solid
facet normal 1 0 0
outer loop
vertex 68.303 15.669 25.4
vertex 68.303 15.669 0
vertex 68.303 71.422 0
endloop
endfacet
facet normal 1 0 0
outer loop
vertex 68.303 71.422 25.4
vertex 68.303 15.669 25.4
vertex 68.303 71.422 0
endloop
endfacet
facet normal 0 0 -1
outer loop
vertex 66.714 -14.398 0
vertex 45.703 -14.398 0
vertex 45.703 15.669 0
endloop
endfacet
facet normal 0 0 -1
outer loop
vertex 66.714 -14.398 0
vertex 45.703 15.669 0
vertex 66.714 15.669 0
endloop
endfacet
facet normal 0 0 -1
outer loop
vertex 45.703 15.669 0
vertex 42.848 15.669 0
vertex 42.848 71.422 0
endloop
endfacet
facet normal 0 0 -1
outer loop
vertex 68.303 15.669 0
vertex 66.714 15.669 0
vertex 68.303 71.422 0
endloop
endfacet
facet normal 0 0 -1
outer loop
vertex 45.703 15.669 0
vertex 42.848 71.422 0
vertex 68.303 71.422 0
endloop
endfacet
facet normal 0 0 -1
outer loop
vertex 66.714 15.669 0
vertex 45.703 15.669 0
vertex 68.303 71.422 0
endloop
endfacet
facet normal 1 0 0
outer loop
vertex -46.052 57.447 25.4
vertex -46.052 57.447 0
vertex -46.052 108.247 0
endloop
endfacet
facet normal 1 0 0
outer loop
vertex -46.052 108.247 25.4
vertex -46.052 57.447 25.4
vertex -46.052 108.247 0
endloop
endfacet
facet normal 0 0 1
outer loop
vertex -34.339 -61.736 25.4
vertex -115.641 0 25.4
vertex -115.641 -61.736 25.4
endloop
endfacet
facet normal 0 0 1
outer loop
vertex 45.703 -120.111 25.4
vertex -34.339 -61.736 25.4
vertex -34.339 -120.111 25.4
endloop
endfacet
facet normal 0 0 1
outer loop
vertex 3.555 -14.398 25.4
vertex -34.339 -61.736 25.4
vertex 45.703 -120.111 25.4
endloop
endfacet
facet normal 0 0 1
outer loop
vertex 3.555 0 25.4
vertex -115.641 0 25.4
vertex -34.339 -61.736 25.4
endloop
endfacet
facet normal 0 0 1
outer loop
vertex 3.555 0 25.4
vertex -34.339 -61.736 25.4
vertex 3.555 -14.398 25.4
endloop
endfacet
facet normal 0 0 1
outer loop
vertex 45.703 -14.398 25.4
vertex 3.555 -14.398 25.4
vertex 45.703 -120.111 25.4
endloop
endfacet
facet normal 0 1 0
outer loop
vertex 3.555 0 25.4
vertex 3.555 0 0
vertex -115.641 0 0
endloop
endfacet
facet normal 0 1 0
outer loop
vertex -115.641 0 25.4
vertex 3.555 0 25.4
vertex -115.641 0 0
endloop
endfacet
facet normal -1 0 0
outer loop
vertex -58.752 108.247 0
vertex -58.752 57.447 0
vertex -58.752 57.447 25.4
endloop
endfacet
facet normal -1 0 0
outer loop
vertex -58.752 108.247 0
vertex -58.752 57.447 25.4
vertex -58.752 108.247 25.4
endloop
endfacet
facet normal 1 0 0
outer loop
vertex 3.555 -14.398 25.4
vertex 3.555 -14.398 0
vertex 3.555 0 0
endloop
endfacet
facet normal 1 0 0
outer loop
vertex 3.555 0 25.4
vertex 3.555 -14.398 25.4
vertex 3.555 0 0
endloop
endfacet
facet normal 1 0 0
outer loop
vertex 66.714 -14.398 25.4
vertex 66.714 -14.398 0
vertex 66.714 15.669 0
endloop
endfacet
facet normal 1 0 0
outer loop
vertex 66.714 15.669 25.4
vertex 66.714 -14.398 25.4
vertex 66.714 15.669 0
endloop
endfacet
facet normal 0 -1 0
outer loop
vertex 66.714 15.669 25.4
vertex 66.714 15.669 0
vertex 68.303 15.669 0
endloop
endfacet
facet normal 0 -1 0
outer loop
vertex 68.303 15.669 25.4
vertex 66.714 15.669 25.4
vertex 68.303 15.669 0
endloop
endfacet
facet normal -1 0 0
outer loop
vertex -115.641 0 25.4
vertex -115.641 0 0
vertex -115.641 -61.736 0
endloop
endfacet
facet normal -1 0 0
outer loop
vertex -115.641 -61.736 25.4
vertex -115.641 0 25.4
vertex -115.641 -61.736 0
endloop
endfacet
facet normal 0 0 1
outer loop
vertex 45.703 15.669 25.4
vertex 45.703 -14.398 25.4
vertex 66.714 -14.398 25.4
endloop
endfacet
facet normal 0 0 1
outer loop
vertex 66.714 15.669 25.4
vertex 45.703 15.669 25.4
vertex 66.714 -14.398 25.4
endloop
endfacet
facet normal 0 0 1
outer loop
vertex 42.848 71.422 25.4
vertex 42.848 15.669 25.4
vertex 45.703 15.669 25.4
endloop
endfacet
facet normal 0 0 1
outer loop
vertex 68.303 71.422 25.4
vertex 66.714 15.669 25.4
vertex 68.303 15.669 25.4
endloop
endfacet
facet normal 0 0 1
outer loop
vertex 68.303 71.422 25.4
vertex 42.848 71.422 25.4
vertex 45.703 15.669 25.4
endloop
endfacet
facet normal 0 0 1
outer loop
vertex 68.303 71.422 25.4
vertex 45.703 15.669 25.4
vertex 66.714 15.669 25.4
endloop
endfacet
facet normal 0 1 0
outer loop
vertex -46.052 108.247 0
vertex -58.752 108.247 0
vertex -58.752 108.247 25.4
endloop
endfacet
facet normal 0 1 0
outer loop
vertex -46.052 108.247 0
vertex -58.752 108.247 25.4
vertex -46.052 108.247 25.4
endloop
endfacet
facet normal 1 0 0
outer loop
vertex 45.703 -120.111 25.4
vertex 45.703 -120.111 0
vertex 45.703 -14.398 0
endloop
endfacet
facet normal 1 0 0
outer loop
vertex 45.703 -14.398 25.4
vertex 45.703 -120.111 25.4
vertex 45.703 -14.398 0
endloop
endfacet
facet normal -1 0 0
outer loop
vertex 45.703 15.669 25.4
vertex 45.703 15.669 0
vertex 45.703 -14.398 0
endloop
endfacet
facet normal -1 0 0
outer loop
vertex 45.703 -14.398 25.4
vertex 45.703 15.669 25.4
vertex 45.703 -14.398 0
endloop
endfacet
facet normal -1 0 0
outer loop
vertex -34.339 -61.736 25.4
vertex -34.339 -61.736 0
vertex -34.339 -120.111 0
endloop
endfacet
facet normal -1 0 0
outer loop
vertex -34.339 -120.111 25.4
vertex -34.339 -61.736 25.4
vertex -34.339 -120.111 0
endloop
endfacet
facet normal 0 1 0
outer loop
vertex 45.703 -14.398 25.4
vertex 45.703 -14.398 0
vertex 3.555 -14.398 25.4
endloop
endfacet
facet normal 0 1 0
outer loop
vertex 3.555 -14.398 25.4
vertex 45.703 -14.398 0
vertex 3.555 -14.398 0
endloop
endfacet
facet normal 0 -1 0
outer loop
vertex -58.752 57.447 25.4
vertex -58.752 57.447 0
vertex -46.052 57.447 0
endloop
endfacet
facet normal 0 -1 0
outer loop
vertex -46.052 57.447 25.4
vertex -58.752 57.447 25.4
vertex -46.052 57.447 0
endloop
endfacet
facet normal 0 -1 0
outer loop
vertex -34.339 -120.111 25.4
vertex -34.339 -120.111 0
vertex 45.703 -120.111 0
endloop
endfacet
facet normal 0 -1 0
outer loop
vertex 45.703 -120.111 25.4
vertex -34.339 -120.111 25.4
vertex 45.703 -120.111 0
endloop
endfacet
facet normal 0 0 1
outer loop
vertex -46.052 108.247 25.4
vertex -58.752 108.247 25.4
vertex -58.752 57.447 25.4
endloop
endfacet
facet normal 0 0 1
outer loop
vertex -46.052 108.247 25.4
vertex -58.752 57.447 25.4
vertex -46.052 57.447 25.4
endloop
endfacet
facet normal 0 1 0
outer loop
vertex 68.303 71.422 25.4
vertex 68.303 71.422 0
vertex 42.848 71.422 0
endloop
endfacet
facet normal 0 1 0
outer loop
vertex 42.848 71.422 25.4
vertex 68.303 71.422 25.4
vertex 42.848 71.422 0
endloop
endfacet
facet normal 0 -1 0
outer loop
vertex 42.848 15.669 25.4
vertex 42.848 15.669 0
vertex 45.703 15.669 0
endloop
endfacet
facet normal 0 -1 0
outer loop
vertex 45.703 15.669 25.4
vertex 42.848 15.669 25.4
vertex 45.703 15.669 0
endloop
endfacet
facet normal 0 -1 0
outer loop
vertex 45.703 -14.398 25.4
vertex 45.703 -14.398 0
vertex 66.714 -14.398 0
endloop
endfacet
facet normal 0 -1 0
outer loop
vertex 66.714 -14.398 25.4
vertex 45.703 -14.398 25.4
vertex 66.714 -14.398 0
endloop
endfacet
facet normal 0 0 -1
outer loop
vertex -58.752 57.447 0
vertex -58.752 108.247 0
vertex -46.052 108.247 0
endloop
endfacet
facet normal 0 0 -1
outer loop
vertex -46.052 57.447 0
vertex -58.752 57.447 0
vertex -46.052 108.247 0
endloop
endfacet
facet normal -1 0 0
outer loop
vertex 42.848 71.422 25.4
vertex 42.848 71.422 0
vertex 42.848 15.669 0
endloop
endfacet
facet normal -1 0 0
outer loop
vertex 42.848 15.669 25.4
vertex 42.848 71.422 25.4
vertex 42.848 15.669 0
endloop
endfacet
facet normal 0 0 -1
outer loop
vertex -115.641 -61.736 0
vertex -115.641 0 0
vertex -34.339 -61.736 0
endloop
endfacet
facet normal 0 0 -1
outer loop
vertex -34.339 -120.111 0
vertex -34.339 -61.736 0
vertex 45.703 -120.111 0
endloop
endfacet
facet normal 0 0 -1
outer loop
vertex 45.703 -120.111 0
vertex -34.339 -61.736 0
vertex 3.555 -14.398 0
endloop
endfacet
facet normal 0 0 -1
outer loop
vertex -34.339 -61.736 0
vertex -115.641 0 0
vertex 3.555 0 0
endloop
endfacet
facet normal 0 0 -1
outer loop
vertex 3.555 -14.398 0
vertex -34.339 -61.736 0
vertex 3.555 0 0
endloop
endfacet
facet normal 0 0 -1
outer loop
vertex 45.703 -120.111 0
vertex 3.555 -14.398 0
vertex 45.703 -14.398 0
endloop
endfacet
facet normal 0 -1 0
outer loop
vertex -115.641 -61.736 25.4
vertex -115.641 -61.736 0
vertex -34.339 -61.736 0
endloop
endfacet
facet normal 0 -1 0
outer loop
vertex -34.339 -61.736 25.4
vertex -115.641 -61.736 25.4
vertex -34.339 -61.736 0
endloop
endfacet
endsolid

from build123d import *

# Parameters (mm, degrees)
F0_W     = 37.8937845179
F0_H     = 47.3373946244
F1_DEPTH = 25.4
F0_W_2   = 21.0103082003
F0_H_2   = 30.0672181955
F0_H_3   = 0.2619628472
F0_W_3   = 12.7
F0_H_4   = 50.8


with BuildPart() as f1:
    # F0 (on Top) → F1 (new body)
    with BuildSketch(Plane.XY):
        Polygon((3.5545719384, -14.3982255389), (3.5545719384, 0), (-115.641171745, 0), (-115.641171745, -61.7356201633), (-34.3392125795, -61.7356201633), (-34.3392125795, -14.3982255389), align=None)
        Polygon((45.7032573575, -14.3982255389), (3.5545719384, -14.3982255389), (3.5545719384, -61.7356201633), (-34.3392125795, -61.7356201633), (-34.3392125795, -120.1114062909), (45.7032573575, -120.1114062909), align=None)
        with Locations((-15.3923203205, -38.0669228511)):
            Rectangle(F0_W, F0_H)
    extrude(amount=F1_DEPTH)


with BuildPart() as f1b:
    # F0 (on Top) → F1, piece 2 (new body)
    with BuildSketch(Plane.XY):
        with Locations((56.2084114576, 0.6353835588)):
            Rectangle(F0_W_2, F0_H_2)
        with Locations((56.2084114576, 15.7999740802)):
            Rectangle(F0_W_2, F0_H_3)
        Polygon((42.8484153111, 15.6689926566), (45.7032573575, 15.6689926566), (45.7032573575, 15.9309555038), (66.7135655578, 15.9309555038), (66.7135655578, 15.6689926566), (68.3027617726, 15.6689926566), (68.3027617726, 71.4222609481), (42.8484153111, 71.4222609481), align=None)
    extrude(amount=F1_DEPTH)


with BuildPart() as f1c:
    # F0 (on Top) → F1, piece 3 (new body)
    with BuildSketch(Plane.XY):
        with Locations((-52.4015846889, 82.8471958824)):
            Rectangle(F0_W_3, F0_H_4)
    extrude(amount=F1_DEPTH)


solid = Compound([f1.part, f1b.part, f1c.part])
